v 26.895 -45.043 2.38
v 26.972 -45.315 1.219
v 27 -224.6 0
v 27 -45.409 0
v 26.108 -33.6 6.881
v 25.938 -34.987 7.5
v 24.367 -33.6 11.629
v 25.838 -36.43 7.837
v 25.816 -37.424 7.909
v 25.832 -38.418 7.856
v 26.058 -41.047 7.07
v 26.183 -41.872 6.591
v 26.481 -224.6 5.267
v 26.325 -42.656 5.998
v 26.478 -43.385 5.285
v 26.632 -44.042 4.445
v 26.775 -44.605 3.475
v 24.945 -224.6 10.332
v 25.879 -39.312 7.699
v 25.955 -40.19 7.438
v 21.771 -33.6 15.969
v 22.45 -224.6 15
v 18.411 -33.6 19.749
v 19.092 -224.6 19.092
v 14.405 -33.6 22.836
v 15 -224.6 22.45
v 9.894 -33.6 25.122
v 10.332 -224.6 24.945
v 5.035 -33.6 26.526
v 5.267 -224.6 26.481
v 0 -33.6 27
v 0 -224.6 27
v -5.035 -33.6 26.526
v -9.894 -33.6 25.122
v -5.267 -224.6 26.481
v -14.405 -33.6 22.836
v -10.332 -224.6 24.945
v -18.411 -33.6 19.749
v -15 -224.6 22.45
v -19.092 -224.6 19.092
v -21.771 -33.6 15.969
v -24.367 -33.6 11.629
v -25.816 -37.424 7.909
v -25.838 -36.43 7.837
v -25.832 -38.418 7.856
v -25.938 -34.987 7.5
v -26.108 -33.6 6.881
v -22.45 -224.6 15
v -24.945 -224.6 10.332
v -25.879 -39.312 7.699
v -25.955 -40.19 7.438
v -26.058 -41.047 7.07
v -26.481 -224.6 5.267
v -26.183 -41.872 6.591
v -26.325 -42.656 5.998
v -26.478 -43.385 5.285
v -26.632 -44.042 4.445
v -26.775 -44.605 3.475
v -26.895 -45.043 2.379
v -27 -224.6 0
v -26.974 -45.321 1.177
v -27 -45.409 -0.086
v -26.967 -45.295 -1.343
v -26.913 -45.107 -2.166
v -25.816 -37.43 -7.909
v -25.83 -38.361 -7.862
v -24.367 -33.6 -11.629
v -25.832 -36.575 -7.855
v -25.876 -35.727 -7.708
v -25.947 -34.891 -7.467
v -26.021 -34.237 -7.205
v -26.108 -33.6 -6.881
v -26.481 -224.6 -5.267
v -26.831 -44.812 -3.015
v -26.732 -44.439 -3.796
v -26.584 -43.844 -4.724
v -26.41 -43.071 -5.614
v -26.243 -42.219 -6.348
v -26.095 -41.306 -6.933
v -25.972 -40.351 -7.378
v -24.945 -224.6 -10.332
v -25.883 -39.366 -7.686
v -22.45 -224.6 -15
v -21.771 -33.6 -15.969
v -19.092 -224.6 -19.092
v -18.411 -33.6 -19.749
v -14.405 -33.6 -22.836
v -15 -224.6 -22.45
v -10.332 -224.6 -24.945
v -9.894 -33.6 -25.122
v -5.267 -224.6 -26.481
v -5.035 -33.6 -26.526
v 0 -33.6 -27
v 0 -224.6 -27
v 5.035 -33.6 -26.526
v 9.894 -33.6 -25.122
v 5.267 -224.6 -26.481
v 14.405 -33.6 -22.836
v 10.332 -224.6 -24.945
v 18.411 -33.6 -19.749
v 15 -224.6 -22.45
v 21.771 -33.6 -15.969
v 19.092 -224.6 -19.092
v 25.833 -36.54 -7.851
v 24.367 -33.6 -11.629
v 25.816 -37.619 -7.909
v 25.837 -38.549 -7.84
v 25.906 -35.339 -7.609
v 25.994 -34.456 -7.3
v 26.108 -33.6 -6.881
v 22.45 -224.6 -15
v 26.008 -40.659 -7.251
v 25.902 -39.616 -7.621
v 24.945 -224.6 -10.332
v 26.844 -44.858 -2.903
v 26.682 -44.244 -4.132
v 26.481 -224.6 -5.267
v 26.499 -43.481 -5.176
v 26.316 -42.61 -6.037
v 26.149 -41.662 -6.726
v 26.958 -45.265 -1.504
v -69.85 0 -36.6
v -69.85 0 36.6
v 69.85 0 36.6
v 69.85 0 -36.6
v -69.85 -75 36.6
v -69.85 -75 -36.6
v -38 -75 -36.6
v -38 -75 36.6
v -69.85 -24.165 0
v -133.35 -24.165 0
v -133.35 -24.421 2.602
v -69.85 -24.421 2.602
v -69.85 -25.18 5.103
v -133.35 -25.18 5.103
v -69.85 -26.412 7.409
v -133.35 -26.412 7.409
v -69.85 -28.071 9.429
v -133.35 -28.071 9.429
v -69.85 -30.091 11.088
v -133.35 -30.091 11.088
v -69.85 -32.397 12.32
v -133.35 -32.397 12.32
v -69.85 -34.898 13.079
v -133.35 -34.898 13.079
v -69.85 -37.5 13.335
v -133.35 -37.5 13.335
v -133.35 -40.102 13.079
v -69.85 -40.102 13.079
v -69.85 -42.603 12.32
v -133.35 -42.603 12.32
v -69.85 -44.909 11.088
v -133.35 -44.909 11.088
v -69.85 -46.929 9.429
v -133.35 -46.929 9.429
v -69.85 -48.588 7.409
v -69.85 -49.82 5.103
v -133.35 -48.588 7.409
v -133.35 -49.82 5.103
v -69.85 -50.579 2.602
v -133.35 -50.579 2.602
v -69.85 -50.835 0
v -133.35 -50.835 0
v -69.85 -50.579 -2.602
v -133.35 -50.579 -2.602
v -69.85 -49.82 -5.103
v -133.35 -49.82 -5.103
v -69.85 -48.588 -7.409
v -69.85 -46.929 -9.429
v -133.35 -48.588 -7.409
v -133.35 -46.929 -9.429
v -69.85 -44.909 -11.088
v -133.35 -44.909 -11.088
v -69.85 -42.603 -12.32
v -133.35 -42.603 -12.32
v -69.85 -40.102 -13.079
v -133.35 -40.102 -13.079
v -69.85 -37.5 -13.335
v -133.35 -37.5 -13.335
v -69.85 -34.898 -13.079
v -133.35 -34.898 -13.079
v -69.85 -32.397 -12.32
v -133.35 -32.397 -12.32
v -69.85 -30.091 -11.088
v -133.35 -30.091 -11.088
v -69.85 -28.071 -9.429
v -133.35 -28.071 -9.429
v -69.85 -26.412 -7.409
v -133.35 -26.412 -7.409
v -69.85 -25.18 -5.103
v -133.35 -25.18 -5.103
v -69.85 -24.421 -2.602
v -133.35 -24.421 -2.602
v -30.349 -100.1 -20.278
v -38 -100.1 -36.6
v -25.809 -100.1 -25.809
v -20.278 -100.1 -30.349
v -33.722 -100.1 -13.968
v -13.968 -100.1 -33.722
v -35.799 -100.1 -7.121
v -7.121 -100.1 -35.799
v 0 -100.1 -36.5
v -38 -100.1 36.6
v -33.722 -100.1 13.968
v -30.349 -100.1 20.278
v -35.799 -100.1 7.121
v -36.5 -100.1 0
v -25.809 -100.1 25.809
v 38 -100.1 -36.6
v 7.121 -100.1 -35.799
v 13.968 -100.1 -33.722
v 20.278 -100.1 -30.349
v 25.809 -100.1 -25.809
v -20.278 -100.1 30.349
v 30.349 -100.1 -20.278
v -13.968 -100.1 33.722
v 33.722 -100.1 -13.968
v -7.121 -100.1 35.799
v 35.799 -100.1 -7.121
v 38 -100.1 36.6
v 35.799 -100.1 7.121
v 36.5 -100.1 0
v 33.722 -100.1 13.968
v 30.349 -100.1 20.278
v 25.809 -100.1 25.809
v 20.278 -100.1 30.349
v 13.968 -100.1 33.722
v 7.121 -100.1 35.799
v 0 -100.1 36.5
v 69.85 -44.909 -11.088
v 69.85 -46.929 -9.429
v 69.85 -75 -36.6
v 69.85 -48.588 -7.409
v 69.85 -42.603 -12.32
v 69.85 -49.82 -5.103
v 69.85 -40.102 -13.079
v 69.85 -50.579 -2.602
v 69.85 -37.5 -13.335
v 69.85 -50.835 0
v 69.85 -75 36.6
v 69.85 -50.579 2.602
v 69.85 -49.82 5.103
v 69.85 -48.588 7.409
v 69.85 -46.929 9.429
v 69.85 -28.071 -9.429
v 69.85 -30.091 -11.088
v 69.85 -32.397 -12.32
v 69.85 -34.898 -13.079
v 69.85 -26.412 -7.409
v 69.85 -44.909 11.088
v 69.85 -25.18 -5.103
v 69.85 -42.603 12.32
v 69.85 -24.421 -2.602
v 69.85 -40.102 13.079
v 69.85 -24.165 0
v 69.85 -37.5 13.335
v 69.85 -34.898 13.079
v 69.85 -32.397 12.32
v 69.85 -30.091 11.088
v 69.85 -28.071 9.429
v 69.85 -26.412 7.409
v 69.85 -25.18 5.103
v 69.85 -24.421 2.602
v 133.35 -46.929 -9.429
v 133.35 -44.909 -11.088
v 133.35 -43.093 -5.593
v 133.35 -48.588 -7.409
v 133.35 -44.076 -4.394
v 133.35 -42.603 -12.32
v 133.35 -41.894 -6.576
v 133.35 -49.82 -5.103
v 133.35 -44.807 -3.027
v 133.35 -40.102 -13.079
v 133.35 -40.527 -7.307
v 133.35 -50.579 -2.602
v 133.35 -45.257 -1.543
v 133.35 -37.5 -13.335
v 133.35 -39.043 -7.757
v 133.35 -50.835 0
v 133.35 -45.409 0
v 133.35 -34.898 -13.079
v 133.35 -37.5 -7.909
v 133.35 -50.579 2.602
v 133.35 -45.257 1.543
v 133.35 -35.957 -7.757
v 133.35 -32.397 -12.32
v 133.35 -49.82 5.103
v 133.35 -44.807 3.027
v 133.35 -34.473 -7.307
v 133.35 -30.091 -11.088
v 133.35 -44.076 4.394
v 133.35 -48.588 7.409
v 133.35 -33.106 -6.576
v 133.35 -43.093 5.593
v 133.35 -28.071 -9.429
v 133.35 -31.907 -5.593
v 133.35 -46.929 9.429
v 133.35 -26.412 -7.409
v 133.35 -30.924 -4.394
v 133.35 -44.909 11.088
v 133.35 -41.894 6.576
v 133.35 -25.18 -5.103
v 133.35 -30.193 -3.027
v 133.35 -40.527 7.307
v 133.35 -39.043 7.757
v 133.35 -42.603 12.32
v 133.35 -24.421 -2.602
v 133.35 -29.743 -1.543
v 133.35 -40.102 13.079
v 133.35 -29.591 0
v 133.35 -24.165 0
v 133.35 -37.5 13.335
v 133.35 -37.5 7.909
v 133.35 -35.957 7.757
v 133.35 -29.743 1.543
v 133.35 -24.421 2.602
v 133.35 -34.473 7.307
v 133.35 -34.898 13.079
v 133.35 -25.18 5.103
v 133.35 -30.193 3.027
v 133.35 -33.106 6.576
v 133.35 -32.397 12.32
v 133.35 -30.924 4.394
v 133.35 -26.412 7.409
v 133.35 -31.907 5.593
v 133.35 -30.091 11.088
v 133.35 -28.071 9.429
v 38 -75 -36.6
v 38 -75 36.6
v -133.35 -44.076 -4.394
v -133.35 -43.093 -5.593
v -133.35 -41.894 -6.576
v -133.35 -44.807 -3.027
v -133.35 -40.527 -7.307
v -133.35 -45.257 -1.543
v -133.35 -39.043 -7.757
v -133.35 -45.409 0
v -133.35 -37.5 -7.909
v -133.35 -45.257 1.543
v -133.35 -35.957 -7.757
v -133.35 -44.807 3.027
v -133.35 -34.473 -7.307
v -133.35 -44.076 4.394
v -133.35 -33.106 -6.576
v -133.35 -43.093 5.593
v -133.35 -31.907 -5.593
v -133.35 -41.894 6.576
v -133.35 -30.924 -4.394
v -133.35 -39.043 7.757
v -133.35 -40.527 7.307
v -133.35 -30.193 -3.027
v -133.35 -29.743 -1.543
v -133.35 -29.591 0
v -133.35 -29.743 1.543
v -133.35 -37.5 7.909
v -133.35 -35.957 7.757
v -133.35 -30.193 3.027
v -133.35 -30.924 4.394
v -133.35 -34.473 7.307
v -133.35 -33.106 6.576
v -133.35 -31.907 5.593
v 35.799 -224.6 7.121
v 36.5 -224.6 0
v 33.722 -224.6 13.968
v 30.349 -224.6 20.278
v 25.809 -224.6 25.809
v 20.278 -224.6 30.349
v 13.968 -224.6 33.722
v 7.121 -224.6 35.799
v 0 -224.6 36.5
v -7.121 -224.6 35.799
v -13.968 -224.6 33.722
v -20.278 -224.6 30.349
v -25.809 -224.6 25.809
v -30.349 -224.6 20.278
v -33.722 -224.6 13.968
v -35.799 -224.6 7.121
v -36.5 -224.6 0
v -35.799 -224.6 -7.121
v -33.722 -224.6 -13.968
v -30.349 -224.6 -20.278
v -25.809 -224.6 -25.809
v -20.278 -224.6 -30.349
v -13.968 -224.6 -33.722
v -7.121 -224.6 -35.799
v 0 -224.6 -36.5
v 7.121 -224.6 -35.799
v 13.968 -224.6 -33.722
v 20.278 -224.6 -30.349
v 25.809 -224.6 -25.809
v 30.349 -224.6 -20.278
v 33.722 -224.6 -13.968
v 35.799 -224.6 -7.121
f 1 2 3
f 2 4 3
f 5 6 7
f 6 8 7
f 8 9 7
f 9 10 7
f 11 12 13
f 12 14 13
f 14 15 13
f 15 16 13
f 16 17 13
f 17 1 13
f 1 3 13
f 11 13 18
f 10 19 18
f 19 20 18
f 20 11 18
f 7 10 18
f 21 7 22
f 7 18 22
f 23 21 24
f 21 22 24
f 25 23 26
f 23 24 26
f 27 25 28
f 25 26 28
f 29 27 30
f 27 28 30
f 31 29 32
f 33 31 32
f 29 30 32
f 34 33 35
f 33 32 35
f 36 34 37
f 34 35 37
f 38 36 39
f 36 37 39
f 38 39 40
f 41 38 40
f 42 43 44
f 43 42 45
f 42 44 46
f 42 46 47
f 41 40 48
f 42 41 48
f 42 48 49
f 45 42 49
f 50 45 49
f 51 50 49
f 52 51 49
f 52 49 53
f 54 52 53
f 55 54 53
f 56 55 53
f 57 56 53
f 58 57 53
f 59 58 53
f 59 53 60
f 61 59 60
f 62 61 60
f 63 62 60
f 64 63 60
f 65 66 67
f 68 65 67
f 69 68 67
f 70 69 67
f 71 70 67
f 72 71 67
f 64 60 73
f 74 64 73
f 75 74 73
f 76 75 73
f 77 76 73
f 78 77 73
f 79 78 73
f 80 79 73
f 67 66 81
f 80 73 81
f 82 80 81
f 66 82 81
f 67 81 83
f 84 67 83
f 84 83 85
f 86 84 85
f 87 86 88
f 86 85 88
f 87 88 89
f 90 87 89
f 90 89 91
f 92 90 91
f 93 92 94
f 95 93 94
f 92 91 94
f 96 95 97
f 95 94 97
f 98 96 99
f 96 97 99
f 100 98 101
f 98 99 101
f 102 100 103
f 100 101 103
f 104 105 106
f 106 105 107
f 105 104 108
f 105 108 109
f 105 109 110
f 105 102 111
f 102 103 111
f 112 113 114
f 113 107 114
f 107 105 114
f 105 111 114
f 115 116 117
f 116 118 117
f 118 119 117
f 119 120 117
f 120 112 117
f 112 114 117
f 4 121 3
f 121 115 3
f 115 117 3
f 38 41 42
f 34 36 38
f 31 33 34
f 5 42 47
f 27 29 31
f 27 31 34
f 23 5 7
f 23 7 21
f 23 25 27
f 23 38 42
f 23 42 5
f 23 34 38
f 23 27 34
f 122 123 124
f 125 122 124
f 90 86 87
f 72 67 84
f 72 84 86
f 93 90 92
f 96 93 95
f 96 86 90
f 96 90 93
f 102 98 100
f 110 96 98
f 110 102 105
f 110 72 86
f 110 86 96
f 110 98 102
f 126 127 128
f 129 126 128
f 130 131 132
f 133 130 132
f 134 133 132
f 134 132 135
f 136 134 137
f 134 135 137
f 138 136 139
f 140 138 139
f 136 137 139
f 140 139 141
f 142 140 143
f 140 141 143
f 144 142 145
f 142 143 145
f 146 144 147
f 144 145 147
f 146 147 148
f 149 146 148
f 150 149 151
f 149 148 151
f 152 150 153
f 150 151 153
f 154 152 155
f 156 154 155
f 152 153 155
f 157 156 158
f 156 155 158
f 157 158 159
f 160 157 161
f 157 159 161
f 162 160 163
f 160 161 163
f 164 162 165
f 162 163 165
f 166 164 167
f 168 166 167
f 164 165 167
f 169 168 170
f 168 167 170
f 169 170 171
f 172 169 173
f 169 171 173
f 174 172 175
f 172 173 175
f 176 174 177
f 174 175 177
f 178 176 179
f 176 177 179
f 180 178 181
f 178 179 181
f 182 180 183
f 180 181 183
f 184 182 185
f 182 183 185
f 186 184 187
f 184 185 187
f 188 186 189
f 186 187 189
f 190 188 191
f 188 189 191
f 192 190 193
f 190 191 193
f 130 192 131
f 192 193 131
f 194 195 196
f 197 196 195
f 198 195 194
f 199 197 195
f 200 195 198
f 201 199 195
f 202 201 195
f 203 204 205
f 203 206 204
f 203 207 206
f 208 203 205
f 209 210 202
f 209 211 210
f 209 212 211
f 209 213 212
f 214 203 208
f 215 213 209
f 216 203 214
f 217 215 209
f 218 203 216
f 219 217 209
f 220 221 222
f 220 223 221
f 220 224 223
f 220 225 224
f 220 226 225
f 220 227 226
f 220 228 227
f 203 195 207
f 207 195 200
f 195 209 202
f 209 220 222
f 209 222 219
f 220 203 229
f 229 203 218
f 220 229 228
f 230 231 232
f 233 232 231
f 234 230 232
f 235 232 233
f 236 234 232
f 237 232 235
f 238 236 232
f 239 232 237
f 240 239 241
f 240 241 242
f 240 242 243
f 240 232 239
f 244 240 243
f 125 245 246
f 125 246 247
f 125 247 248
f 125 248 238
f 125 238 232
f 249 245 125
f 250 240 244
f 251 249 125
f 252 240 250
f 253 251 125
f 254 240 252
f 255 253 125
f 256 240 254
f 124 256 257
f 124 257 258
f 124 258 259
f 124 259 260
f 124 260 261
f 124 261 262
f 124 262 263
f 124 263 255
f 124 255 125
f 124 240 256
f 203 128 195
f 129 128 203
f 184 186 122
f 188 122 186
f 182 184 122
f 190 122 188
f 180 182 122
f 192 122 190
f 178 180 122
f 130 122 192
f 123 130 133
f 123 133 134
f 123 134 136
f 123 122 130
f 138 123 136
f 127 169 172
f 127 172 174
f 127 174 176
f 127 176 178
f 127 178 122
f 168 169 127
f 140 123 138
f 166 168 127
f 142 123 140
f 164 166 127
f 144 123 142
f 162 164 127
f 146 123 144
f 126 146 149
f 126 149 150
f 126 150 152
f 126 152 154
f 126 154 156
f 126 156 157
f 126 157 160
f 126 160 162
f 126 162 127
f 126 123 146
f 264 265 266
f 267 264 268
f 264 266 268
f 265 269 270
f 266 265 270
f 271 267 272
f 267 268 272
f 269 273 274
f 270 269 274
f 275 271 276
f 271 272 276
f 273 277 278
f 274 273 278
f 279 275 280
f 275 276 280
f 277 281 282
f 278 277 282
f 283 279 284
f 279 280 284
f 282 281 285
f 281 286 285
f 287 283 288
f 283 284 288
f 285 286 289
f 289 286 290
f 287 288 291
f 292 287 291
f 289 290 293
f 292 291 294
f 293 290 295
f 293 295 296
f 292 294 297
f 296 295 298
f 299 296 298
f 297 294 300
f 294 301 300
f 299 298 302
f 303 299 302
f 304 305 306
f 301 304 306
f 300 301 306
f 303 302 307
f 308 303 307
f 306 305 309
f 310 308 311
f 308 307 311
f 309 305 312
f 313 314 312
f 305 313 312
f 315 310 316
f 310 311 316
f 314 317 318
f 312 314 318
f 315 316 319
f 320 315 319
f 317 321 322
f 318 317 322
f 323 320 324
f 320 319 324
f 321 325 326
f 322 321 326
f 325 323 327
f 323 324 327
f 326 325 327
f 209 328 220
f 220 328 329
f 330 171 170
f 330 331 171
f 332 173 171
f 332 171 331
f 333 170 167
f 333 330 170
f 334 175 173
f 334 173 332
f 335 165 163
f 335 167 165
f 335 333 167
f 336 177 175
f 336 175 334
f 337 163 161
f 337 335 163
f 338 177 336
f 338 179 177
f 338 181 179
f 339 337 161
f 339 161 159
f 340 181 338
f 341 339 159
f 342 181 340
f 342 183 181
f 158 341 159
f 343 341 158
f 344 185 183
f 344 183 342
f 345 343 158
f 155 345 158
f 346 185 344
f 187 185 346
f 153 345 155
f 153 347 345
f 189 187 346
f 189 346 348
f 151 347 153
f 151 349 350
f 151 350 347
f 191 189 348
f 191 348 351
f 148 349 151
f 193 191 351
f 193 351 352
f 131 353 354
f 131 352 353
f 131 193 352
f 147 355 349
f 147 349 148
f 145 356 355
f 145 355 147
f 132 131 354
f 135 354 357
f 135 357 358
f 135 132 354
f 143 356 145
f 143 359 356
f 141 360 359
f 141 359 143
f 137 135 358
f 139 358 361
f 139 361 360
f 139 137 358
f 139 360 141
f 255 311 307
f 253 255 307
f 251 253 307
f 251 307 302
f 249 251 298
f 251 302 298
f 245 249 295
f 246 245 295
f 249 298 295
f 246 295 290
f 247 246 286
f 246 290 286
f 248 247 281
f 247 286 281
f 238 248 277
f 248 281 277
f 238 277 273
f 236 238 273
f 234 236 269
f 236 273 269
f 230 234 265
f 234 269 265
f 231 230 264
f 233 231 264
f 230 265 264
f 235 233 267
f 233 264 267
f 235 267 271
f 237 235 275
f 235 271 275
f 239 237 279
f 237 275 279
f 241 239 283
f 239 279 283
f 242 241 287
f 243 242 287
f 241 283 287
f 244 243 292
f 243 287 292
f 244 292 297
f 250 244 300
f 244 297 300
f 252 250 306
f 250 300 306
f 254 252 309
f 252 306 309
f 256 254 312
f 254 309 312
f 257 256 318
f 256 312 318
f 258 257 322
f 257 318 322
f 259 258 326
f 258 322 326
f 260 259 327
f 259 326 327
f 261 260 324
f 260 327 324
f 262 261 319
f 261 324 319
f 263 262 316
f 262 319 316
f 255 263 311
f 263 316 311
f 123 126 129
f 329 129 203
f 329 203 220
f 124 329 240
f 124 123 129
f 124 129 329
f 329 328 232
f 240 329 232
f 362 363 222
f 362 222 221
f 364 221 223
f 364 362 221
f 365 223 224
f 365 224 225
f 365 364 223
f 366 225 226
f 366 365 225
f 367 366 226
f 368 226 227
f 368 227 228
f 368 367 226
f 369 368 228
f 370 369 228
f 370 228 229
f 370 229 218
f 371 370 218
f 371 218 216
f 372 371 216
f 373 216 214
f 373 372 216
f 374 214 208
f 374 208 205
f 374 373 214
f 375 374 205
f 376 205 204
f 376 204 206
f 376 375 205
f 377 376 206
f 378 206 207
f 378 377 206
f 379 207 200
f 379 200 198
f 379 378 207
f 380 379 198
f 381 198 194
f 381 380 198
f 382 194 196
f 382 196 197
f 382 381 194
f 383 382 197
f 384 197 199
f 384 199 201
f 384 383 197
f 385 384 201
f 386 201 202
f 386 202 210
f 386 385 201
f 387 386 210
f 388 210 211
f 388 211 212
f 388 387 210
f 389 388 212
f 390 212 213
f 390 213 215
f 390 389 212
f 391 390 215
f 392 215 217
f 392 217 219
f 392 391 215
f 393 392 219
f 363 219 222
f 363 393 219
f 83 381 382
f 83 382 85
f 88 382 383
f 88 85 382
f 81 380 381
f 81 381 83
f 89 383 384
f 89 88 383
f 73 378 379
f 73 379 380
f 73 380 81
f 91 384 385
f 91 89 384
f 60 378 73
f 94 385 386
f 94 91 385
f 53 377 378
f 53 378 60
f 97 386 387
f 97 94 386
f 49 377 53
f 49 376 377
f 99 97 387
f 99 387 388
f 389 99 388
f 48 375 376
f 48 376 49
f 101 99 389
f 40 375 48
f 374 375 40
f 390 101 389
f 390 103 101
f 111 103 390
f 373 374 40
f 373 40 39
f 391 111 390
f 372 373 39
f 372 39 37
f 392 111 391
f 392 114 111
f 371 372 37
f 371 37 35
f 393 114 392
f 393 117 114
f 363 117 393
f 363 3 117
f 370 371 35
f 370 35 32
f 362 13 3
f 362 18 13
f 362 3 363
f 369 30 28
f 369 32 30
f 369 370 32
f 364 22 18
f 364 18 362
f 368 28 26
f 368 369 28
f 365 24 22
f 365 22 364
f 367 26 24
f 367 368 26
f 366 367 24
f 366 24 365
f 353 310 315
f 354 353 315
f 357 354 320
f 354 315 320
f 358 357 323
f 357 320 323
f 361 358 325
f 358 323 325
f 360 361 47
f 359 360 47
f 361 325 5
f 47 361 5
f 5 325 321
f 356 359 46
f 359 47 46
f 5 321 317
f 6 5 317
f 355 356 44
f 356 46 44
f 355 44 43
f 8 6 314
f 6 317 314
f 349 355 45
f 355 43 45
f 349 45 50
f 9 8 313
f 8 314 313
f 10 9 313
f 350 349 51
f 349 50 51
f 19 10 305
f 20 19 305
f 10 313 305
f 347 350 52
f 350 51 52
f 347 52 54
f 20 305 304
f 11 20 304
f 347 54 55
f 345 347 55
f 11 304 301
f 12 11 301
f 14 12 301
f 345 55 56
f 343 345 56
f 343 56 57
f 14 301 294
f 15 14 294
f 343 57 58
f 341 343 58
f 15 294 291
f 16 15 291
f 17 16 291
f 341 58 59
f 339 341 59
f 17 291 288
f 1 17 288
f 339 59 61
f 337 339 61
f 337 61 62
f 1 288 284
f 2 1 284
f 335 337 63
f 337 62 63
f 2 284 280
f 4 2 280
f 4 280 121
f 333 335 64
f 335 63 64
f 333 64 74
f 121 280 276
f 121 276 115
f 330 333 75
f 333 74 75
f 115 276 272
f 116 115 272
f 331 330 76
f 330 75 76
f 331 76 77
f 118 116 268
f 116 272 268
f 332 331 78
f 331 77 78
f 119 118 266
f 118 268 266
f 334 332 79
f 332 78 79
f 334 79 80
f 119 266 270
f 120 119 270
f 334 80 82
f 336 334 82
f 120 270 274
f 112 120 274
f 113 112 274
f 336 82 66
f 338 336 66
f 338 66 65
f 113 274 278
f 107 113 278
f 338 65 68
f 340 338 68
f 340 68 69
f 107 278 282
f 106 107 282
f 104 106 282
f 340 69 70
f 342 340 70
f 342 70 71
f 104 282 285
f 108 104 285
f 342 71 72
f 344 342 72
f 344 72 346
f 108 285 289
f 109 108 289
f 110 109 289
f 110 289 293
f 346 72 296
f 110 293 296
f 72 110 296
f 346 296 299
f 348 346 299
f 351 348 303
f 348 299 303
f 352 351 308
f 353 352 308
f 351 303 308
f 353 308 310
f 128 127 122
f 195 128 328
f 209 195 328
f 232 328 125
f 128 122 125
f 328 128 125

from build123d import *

# Parameters (mm, degrees)
F0_W      = 266.7
F0_H      = 73.2
F1_DEPTH  = 75
F2_W      = 76
F2_H      = 73.2
F3_DEPTH  = 124.6
F4_R      = 58.834667
F5_DEPTH  = 63.5
F6_R      = 62.865407
F7_DEPTH  = 63.5
F3_FACE_W = 76
F3_FACE_H = 73.2
F8_DEPTH  = 25
F9_R      = 76.896223
F9_R_2    = 36.5
F10_DEPTH = 124.5
F11_R     = 27
F12_DEPTH = 191
F13_R     = 7.90944
F14_DEPTH = 291


with BuildPart() as f1:
    # F0 (on Front) → F1 (new body)
    with BuildSketch(Plane.XZ):
        Rectangle(F0_W, F0_H)
    extrude(amount=F1_DEPTH)

    # F2 (on face) → F3 (join)
    with BuildSketch(Plane.XZ.offset(75)):
        Rectangle(F2_W, F2_H)
    extrude(amount=F3_DEPTH)

    # F4 (on face) → F5 (cut)
    with BuildSketch(Plane.YZ.offset(133.35)):
        with Locations((-37.5, 0)):
            Circle(F4_R)
        with BuildLine():
            ThreePointArc((-50.835, 0), (-37.5, 13.335), (-24.165, 0))
            ThreePointArc((-24.165, 0), (-37.5, -13.335), (-50.835, 0))
        make_face(mode=Mode.SUBTRACT)
    extrude(amount=-F5_DEPTH, mode=Mode.SUBTRACT)

    # F6 (on face) → F7 (cut)
    with BuildSketch(Plane(origin=(-133.35, 0, 0), x_dir=(0, -1, 0), z_dir=(-1, 0, 0))):
        with Locations((37.5, 0)):
            Circle(F6_R)
        with BuildLine():
            ThreePointArc((50.835, 0), (37.5, -13.335), (24.165, 0))
            ThreePointArc((24.165, 0), (37.5, 13.335), (50.835, 0))
        make_face(mode=Mode.SUBTRACT)
    extrude(amount=-F7_DEPTH, mode=Mode.SUBTRACT)

    # F3_face (on face) → F8 (join)
    with BuildSketch(Plane.XZ.offset(199.6)):
        Rectangle(F3_FACE_W, F3_FACE_H)
    extrude(amount=F8_DEPTH)

    # F9 (on face) → F10 (cut)
    with BuildSketch(Plane.XZ.offset(224.6)):
        Circle(F9_R)
        Circle(F9_R_2, mode=Mode.SUBTRACT)
    extrude(amount=-F10_DEPTH, mode=Mode.SUBTRACT)

    # F11 (on face) → F12 (cut)
    with BuildSketch(Plane.XZ.offset(224.6)):
        Circle(F11_R)
    extrude(amount=-F12_DEPTH, mode=Mode.SUBTRACT)

    # F13 (on face) → F14 (cut)
    with BuildSketch(Plane.YZ.offset(133.35)):
        with Locations((-37.5, 0)):
            Circle(F13_R)
    extrude(amount=-F14_DEPTH, mode=Mode.SUBTRACT)


solid = f1.part
